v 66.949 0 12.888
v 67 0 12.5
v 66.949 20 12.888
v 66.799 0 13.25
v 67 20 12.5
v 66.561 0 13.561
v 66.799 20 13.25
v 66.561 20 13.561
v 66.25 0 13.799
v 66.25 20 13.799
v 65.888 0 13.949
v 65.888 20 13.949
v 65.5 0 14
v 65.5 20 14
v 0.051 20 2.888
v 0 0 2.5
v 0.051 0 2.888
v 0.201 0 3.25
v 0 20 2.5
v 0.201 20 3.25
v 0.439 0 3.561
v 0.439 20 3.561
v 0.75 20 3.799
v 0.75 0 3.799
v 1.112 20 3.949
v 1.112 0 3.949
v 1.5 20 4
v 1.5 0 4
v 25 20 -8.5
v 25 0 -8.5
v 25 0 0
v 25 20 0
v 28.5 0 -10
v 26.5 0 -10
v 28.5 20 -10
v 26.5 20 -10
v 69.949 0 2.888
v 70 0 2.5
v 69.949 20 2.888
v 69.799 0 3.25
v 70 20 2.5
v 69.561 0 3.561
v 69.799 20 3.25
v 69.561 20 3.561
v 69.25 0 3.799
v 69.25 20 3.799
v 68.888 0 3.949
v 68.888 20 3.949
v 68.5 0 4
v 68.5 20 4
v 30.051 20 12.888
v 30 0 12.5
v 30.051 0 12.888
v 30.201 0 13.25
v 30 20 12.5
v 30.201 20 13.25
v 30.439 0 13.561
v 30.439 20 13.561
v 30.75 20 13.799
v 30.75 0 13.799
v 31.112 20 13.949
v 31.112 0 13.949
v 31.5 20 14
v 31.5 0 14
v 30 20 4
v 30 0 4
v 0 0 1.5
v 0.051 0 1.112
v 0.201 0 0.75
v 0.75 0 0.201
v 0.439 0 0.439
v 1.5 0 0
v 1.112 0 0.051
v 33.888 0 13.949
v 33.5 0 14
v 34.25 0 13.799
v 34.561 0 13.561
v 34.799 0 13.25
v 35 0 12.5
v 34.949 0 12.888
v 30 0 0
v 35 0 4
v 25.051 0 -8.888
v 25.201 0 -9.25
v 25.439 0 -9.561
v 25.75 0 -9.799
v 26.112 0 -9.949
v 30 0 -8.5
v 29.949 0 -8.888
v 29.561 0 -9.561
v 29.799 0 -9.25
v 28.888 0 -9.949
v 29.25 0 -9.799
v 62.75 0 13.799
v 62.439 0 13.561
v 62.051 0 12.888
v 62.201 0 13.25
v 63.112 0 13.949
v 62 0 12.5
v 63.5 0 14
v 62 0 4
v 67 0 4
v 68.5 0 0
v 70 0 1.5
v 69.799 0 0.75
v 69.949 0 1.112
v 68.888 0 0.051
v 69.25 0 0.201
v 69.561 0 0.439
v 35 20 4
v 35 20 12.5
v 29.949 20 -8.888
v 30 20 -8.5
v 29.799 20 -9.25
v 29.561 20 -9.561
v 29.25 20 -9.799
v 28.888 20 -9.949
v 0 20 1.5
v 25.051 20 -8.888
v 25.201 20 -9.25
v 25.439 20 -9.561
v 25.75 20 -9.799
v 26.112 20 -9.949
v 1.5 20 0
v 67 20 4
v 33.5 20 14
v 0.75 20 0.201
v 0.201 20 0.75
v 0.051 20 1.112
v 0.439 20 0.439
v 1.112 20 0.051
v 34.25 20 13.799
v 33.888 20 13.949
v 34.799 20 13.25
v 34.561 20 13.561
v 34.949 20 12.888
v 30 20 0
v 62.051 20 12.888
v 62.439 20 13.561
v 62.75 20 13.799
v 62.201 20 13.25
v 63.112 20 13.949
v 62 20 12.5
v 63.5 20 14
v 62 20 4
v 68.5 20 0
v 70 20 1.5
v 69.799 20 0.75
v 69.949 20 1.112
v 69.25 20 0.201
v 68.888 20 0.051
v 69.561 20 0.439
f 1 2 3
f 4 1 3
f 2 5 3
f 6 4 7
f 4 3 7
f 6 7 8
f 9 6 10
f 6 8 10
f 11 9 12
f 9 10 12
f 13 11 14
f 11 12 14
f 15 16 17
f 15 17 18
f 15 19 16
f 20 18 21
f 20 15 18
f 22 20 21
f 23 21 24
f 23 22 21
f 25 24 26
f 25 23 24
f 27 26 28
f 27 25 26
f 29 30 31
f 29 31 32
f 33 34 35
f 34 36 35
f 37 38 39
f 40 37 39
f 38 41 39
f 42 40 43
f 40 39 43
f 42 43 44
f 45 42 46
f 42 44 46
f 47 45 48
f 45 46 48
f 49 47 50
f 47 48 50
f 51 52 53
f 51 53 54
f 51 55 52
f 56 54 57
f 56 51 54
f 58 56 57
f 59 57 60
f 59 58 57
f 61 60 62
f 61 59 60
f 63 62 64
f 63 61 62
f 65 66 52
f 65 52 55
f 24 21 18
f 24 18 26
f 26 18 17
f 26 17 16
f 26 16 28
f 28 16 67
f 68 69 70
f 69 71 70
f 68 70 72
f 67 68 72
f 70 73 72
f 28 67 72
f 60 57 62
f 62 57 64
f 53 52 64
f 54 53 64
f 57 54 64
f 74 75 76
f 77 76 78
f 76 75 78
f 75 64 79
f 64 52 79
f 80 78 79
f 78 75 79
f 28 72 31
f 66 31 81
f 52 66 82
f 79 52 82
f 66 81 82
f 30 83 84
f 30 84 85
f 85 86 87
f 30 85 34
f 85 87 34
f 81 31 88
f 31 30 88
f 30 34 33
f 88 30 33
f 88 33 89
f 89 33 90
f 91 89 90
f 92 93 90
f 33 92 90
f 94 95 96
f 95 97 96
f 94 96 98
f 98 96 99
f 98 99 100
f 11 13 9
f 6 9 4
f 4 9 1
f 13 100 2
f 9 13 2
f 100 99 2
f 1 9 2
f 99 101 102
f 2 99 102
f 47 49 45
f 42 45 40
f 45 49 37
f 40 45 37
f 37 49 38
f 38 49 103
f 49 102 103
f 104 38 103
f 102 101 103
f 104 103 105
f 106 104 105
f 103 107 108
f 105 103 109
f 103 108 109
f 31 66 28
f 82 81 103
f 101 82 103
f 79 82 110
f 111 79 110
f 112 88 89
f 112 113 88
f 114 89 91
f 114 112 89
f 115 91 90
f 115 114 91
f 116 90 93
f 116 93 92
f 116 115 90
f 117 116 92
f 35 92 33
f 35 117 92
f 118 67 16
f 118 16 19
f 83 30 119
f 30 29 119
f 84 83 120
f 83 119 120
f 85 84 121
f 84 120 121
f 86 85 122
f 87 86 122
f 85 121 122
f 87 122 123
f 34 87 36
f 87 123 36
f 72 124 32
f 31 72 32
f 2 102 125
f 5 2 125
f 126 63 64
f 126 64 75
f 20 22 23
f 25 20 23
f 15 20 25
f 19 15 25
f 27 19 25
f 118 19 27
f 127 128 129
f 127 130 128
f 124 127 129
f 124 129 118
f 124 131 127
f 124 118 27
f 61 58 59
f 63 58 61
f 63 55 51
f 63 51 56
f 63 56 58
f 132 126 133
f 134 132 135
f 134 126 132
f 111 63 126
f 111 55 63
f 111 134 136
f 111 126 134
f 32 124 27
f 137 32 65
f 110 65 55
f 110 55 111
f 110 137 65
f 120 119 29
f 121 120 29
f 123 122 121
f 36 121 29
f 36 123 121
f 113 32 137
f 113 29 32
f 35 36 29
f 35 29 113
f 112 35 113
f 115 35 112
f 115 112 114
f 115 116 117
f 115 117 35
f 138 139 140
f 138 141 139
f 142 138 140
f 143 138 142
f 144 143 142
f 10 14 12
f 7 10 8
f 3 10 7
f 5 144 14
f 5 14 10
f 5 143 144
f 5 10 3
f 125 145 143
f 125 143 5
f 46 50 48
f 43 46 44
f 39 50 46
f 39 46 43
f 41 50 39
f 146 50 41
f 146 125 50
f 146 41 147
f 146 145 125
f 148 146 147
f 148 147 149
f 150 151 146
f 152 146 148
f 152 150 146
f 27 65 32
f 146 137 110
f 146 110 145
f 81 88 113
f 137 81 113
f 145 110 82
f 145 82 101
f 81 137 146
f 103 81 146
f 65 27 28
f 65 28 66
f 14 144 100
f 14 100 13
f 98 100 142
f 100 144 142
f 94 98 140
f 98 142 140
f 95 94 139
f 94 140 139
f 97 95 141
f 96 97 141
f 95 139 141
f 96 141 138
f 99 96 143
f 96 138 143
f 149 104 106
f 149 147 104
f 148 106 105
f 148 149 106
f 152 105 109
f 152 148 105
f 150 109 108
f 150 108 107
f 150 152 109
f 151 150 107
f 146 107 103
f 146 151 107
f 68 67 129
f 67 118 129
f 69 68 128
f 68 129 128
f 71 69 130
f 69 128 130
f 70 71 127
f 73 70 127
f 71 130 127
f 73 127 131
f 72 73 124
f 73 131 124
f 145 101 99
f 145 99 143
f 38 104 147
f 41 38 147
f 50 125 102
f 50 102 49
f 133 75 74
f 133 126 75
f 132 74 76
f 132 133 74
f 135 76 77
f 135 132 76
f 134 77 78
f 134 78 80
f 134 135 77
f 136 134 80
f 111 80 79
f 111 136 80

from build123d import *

# Parameters (mm, degrees)
BOX002_W     = 27
BOX002_H     = 20
BOX002_DEPTH = 10
BOX001_W     = 37
BOX001_H     = 20
BOX001_DEPTH = 10
FILLET001_R  = 1.5
BOX003_W     = 5
BOX003_H     = 20
BOX003_DEPTH = 10
FILLET002_R  = 1.5
BOX_W        = 70
BOX_H        = 20
BOX_DEPTH    = 4
FILLET_R     = 1.5


with BuildPart() as cube002:
    # Box002 → Box002 (new body)
    with BuildSketch(Plane(origin=(35, 0, 4), x_dir=(1, 0, 0), z_dir=(0, 0, 1))):
        with Locations((13.5, 10)):
            Rectangle(BOX002_W, BOX002_H)
    extrude(amount=BOX002_DEPTH)


with BuildPart() as fillet001:
    # Box001 → Box001 (new body)
    with BuildSketch(Plane(origin=(30, 0, 4), x_dir=(1, 0, 0), z_dir=(0, 0, 1))):
        with Locations((18.5, 10)):
            Rectangle(BOX001_W, BOX001_H)
    extrude(amount=BOX001_DEPTH)

    # Cut001: cut Cube002
    add(cube002.part, mode=Mode.SUBTRACT)

    # Fillet001
    fillet001_edges = [fillet001.edges().sort_by_distance(p)[0] for p in [
        (30, 10, 14),
        (35, 10, 14),
        (67, 10, 14),
        (62, 10, 14),
    ]]
    fillet(fillet001_edges, radius=FILLET001_R)


with BuildPart() as fillet002:
    # Box003 → Box003 (new body)
    with BuildSketch(Plane(origin=(25, 0, -10), x_dir=(1, 0, 0), z_dir=(0, 0, 1))):
        with Locations((2.5, 10)):
            Rectangle(BOX003_W, BOX003_H)
    extrude(amount=BOX003_DEPTH)

    # Fillet002
    fillet002_edges = [fillet002.edges().sort_by_distance(p)[0] for p in [
        (25, 10, -10),
        (30, 10, -10),
    ]]
    fillet(fillet002_edges, radius=FILLET002_R)


with BuildPart() as fusion:
    # Box → Box (new body)
    with BuildSketch(Plane.XY):
        with Locations((35, 10)):
            Rectangle(BOX_W, BOX_H)
    extrude(amount=BOX_DEPTH)

    # Fillet
    fillet_edges = [fusion.edges().sort_by_distance(p)[0] for p in [
        (0, 10, 4),
        (0, 10, 0),
        (70, 10, 4),
        (70, 10, 0),
    ]]
    fillet(fillet_edges, radius=FILLET_R)

    # Fusion: union Fillet001, Fillet002
    add(fillet001.part)
    add(fillet002.part)


solid = fusion.part
